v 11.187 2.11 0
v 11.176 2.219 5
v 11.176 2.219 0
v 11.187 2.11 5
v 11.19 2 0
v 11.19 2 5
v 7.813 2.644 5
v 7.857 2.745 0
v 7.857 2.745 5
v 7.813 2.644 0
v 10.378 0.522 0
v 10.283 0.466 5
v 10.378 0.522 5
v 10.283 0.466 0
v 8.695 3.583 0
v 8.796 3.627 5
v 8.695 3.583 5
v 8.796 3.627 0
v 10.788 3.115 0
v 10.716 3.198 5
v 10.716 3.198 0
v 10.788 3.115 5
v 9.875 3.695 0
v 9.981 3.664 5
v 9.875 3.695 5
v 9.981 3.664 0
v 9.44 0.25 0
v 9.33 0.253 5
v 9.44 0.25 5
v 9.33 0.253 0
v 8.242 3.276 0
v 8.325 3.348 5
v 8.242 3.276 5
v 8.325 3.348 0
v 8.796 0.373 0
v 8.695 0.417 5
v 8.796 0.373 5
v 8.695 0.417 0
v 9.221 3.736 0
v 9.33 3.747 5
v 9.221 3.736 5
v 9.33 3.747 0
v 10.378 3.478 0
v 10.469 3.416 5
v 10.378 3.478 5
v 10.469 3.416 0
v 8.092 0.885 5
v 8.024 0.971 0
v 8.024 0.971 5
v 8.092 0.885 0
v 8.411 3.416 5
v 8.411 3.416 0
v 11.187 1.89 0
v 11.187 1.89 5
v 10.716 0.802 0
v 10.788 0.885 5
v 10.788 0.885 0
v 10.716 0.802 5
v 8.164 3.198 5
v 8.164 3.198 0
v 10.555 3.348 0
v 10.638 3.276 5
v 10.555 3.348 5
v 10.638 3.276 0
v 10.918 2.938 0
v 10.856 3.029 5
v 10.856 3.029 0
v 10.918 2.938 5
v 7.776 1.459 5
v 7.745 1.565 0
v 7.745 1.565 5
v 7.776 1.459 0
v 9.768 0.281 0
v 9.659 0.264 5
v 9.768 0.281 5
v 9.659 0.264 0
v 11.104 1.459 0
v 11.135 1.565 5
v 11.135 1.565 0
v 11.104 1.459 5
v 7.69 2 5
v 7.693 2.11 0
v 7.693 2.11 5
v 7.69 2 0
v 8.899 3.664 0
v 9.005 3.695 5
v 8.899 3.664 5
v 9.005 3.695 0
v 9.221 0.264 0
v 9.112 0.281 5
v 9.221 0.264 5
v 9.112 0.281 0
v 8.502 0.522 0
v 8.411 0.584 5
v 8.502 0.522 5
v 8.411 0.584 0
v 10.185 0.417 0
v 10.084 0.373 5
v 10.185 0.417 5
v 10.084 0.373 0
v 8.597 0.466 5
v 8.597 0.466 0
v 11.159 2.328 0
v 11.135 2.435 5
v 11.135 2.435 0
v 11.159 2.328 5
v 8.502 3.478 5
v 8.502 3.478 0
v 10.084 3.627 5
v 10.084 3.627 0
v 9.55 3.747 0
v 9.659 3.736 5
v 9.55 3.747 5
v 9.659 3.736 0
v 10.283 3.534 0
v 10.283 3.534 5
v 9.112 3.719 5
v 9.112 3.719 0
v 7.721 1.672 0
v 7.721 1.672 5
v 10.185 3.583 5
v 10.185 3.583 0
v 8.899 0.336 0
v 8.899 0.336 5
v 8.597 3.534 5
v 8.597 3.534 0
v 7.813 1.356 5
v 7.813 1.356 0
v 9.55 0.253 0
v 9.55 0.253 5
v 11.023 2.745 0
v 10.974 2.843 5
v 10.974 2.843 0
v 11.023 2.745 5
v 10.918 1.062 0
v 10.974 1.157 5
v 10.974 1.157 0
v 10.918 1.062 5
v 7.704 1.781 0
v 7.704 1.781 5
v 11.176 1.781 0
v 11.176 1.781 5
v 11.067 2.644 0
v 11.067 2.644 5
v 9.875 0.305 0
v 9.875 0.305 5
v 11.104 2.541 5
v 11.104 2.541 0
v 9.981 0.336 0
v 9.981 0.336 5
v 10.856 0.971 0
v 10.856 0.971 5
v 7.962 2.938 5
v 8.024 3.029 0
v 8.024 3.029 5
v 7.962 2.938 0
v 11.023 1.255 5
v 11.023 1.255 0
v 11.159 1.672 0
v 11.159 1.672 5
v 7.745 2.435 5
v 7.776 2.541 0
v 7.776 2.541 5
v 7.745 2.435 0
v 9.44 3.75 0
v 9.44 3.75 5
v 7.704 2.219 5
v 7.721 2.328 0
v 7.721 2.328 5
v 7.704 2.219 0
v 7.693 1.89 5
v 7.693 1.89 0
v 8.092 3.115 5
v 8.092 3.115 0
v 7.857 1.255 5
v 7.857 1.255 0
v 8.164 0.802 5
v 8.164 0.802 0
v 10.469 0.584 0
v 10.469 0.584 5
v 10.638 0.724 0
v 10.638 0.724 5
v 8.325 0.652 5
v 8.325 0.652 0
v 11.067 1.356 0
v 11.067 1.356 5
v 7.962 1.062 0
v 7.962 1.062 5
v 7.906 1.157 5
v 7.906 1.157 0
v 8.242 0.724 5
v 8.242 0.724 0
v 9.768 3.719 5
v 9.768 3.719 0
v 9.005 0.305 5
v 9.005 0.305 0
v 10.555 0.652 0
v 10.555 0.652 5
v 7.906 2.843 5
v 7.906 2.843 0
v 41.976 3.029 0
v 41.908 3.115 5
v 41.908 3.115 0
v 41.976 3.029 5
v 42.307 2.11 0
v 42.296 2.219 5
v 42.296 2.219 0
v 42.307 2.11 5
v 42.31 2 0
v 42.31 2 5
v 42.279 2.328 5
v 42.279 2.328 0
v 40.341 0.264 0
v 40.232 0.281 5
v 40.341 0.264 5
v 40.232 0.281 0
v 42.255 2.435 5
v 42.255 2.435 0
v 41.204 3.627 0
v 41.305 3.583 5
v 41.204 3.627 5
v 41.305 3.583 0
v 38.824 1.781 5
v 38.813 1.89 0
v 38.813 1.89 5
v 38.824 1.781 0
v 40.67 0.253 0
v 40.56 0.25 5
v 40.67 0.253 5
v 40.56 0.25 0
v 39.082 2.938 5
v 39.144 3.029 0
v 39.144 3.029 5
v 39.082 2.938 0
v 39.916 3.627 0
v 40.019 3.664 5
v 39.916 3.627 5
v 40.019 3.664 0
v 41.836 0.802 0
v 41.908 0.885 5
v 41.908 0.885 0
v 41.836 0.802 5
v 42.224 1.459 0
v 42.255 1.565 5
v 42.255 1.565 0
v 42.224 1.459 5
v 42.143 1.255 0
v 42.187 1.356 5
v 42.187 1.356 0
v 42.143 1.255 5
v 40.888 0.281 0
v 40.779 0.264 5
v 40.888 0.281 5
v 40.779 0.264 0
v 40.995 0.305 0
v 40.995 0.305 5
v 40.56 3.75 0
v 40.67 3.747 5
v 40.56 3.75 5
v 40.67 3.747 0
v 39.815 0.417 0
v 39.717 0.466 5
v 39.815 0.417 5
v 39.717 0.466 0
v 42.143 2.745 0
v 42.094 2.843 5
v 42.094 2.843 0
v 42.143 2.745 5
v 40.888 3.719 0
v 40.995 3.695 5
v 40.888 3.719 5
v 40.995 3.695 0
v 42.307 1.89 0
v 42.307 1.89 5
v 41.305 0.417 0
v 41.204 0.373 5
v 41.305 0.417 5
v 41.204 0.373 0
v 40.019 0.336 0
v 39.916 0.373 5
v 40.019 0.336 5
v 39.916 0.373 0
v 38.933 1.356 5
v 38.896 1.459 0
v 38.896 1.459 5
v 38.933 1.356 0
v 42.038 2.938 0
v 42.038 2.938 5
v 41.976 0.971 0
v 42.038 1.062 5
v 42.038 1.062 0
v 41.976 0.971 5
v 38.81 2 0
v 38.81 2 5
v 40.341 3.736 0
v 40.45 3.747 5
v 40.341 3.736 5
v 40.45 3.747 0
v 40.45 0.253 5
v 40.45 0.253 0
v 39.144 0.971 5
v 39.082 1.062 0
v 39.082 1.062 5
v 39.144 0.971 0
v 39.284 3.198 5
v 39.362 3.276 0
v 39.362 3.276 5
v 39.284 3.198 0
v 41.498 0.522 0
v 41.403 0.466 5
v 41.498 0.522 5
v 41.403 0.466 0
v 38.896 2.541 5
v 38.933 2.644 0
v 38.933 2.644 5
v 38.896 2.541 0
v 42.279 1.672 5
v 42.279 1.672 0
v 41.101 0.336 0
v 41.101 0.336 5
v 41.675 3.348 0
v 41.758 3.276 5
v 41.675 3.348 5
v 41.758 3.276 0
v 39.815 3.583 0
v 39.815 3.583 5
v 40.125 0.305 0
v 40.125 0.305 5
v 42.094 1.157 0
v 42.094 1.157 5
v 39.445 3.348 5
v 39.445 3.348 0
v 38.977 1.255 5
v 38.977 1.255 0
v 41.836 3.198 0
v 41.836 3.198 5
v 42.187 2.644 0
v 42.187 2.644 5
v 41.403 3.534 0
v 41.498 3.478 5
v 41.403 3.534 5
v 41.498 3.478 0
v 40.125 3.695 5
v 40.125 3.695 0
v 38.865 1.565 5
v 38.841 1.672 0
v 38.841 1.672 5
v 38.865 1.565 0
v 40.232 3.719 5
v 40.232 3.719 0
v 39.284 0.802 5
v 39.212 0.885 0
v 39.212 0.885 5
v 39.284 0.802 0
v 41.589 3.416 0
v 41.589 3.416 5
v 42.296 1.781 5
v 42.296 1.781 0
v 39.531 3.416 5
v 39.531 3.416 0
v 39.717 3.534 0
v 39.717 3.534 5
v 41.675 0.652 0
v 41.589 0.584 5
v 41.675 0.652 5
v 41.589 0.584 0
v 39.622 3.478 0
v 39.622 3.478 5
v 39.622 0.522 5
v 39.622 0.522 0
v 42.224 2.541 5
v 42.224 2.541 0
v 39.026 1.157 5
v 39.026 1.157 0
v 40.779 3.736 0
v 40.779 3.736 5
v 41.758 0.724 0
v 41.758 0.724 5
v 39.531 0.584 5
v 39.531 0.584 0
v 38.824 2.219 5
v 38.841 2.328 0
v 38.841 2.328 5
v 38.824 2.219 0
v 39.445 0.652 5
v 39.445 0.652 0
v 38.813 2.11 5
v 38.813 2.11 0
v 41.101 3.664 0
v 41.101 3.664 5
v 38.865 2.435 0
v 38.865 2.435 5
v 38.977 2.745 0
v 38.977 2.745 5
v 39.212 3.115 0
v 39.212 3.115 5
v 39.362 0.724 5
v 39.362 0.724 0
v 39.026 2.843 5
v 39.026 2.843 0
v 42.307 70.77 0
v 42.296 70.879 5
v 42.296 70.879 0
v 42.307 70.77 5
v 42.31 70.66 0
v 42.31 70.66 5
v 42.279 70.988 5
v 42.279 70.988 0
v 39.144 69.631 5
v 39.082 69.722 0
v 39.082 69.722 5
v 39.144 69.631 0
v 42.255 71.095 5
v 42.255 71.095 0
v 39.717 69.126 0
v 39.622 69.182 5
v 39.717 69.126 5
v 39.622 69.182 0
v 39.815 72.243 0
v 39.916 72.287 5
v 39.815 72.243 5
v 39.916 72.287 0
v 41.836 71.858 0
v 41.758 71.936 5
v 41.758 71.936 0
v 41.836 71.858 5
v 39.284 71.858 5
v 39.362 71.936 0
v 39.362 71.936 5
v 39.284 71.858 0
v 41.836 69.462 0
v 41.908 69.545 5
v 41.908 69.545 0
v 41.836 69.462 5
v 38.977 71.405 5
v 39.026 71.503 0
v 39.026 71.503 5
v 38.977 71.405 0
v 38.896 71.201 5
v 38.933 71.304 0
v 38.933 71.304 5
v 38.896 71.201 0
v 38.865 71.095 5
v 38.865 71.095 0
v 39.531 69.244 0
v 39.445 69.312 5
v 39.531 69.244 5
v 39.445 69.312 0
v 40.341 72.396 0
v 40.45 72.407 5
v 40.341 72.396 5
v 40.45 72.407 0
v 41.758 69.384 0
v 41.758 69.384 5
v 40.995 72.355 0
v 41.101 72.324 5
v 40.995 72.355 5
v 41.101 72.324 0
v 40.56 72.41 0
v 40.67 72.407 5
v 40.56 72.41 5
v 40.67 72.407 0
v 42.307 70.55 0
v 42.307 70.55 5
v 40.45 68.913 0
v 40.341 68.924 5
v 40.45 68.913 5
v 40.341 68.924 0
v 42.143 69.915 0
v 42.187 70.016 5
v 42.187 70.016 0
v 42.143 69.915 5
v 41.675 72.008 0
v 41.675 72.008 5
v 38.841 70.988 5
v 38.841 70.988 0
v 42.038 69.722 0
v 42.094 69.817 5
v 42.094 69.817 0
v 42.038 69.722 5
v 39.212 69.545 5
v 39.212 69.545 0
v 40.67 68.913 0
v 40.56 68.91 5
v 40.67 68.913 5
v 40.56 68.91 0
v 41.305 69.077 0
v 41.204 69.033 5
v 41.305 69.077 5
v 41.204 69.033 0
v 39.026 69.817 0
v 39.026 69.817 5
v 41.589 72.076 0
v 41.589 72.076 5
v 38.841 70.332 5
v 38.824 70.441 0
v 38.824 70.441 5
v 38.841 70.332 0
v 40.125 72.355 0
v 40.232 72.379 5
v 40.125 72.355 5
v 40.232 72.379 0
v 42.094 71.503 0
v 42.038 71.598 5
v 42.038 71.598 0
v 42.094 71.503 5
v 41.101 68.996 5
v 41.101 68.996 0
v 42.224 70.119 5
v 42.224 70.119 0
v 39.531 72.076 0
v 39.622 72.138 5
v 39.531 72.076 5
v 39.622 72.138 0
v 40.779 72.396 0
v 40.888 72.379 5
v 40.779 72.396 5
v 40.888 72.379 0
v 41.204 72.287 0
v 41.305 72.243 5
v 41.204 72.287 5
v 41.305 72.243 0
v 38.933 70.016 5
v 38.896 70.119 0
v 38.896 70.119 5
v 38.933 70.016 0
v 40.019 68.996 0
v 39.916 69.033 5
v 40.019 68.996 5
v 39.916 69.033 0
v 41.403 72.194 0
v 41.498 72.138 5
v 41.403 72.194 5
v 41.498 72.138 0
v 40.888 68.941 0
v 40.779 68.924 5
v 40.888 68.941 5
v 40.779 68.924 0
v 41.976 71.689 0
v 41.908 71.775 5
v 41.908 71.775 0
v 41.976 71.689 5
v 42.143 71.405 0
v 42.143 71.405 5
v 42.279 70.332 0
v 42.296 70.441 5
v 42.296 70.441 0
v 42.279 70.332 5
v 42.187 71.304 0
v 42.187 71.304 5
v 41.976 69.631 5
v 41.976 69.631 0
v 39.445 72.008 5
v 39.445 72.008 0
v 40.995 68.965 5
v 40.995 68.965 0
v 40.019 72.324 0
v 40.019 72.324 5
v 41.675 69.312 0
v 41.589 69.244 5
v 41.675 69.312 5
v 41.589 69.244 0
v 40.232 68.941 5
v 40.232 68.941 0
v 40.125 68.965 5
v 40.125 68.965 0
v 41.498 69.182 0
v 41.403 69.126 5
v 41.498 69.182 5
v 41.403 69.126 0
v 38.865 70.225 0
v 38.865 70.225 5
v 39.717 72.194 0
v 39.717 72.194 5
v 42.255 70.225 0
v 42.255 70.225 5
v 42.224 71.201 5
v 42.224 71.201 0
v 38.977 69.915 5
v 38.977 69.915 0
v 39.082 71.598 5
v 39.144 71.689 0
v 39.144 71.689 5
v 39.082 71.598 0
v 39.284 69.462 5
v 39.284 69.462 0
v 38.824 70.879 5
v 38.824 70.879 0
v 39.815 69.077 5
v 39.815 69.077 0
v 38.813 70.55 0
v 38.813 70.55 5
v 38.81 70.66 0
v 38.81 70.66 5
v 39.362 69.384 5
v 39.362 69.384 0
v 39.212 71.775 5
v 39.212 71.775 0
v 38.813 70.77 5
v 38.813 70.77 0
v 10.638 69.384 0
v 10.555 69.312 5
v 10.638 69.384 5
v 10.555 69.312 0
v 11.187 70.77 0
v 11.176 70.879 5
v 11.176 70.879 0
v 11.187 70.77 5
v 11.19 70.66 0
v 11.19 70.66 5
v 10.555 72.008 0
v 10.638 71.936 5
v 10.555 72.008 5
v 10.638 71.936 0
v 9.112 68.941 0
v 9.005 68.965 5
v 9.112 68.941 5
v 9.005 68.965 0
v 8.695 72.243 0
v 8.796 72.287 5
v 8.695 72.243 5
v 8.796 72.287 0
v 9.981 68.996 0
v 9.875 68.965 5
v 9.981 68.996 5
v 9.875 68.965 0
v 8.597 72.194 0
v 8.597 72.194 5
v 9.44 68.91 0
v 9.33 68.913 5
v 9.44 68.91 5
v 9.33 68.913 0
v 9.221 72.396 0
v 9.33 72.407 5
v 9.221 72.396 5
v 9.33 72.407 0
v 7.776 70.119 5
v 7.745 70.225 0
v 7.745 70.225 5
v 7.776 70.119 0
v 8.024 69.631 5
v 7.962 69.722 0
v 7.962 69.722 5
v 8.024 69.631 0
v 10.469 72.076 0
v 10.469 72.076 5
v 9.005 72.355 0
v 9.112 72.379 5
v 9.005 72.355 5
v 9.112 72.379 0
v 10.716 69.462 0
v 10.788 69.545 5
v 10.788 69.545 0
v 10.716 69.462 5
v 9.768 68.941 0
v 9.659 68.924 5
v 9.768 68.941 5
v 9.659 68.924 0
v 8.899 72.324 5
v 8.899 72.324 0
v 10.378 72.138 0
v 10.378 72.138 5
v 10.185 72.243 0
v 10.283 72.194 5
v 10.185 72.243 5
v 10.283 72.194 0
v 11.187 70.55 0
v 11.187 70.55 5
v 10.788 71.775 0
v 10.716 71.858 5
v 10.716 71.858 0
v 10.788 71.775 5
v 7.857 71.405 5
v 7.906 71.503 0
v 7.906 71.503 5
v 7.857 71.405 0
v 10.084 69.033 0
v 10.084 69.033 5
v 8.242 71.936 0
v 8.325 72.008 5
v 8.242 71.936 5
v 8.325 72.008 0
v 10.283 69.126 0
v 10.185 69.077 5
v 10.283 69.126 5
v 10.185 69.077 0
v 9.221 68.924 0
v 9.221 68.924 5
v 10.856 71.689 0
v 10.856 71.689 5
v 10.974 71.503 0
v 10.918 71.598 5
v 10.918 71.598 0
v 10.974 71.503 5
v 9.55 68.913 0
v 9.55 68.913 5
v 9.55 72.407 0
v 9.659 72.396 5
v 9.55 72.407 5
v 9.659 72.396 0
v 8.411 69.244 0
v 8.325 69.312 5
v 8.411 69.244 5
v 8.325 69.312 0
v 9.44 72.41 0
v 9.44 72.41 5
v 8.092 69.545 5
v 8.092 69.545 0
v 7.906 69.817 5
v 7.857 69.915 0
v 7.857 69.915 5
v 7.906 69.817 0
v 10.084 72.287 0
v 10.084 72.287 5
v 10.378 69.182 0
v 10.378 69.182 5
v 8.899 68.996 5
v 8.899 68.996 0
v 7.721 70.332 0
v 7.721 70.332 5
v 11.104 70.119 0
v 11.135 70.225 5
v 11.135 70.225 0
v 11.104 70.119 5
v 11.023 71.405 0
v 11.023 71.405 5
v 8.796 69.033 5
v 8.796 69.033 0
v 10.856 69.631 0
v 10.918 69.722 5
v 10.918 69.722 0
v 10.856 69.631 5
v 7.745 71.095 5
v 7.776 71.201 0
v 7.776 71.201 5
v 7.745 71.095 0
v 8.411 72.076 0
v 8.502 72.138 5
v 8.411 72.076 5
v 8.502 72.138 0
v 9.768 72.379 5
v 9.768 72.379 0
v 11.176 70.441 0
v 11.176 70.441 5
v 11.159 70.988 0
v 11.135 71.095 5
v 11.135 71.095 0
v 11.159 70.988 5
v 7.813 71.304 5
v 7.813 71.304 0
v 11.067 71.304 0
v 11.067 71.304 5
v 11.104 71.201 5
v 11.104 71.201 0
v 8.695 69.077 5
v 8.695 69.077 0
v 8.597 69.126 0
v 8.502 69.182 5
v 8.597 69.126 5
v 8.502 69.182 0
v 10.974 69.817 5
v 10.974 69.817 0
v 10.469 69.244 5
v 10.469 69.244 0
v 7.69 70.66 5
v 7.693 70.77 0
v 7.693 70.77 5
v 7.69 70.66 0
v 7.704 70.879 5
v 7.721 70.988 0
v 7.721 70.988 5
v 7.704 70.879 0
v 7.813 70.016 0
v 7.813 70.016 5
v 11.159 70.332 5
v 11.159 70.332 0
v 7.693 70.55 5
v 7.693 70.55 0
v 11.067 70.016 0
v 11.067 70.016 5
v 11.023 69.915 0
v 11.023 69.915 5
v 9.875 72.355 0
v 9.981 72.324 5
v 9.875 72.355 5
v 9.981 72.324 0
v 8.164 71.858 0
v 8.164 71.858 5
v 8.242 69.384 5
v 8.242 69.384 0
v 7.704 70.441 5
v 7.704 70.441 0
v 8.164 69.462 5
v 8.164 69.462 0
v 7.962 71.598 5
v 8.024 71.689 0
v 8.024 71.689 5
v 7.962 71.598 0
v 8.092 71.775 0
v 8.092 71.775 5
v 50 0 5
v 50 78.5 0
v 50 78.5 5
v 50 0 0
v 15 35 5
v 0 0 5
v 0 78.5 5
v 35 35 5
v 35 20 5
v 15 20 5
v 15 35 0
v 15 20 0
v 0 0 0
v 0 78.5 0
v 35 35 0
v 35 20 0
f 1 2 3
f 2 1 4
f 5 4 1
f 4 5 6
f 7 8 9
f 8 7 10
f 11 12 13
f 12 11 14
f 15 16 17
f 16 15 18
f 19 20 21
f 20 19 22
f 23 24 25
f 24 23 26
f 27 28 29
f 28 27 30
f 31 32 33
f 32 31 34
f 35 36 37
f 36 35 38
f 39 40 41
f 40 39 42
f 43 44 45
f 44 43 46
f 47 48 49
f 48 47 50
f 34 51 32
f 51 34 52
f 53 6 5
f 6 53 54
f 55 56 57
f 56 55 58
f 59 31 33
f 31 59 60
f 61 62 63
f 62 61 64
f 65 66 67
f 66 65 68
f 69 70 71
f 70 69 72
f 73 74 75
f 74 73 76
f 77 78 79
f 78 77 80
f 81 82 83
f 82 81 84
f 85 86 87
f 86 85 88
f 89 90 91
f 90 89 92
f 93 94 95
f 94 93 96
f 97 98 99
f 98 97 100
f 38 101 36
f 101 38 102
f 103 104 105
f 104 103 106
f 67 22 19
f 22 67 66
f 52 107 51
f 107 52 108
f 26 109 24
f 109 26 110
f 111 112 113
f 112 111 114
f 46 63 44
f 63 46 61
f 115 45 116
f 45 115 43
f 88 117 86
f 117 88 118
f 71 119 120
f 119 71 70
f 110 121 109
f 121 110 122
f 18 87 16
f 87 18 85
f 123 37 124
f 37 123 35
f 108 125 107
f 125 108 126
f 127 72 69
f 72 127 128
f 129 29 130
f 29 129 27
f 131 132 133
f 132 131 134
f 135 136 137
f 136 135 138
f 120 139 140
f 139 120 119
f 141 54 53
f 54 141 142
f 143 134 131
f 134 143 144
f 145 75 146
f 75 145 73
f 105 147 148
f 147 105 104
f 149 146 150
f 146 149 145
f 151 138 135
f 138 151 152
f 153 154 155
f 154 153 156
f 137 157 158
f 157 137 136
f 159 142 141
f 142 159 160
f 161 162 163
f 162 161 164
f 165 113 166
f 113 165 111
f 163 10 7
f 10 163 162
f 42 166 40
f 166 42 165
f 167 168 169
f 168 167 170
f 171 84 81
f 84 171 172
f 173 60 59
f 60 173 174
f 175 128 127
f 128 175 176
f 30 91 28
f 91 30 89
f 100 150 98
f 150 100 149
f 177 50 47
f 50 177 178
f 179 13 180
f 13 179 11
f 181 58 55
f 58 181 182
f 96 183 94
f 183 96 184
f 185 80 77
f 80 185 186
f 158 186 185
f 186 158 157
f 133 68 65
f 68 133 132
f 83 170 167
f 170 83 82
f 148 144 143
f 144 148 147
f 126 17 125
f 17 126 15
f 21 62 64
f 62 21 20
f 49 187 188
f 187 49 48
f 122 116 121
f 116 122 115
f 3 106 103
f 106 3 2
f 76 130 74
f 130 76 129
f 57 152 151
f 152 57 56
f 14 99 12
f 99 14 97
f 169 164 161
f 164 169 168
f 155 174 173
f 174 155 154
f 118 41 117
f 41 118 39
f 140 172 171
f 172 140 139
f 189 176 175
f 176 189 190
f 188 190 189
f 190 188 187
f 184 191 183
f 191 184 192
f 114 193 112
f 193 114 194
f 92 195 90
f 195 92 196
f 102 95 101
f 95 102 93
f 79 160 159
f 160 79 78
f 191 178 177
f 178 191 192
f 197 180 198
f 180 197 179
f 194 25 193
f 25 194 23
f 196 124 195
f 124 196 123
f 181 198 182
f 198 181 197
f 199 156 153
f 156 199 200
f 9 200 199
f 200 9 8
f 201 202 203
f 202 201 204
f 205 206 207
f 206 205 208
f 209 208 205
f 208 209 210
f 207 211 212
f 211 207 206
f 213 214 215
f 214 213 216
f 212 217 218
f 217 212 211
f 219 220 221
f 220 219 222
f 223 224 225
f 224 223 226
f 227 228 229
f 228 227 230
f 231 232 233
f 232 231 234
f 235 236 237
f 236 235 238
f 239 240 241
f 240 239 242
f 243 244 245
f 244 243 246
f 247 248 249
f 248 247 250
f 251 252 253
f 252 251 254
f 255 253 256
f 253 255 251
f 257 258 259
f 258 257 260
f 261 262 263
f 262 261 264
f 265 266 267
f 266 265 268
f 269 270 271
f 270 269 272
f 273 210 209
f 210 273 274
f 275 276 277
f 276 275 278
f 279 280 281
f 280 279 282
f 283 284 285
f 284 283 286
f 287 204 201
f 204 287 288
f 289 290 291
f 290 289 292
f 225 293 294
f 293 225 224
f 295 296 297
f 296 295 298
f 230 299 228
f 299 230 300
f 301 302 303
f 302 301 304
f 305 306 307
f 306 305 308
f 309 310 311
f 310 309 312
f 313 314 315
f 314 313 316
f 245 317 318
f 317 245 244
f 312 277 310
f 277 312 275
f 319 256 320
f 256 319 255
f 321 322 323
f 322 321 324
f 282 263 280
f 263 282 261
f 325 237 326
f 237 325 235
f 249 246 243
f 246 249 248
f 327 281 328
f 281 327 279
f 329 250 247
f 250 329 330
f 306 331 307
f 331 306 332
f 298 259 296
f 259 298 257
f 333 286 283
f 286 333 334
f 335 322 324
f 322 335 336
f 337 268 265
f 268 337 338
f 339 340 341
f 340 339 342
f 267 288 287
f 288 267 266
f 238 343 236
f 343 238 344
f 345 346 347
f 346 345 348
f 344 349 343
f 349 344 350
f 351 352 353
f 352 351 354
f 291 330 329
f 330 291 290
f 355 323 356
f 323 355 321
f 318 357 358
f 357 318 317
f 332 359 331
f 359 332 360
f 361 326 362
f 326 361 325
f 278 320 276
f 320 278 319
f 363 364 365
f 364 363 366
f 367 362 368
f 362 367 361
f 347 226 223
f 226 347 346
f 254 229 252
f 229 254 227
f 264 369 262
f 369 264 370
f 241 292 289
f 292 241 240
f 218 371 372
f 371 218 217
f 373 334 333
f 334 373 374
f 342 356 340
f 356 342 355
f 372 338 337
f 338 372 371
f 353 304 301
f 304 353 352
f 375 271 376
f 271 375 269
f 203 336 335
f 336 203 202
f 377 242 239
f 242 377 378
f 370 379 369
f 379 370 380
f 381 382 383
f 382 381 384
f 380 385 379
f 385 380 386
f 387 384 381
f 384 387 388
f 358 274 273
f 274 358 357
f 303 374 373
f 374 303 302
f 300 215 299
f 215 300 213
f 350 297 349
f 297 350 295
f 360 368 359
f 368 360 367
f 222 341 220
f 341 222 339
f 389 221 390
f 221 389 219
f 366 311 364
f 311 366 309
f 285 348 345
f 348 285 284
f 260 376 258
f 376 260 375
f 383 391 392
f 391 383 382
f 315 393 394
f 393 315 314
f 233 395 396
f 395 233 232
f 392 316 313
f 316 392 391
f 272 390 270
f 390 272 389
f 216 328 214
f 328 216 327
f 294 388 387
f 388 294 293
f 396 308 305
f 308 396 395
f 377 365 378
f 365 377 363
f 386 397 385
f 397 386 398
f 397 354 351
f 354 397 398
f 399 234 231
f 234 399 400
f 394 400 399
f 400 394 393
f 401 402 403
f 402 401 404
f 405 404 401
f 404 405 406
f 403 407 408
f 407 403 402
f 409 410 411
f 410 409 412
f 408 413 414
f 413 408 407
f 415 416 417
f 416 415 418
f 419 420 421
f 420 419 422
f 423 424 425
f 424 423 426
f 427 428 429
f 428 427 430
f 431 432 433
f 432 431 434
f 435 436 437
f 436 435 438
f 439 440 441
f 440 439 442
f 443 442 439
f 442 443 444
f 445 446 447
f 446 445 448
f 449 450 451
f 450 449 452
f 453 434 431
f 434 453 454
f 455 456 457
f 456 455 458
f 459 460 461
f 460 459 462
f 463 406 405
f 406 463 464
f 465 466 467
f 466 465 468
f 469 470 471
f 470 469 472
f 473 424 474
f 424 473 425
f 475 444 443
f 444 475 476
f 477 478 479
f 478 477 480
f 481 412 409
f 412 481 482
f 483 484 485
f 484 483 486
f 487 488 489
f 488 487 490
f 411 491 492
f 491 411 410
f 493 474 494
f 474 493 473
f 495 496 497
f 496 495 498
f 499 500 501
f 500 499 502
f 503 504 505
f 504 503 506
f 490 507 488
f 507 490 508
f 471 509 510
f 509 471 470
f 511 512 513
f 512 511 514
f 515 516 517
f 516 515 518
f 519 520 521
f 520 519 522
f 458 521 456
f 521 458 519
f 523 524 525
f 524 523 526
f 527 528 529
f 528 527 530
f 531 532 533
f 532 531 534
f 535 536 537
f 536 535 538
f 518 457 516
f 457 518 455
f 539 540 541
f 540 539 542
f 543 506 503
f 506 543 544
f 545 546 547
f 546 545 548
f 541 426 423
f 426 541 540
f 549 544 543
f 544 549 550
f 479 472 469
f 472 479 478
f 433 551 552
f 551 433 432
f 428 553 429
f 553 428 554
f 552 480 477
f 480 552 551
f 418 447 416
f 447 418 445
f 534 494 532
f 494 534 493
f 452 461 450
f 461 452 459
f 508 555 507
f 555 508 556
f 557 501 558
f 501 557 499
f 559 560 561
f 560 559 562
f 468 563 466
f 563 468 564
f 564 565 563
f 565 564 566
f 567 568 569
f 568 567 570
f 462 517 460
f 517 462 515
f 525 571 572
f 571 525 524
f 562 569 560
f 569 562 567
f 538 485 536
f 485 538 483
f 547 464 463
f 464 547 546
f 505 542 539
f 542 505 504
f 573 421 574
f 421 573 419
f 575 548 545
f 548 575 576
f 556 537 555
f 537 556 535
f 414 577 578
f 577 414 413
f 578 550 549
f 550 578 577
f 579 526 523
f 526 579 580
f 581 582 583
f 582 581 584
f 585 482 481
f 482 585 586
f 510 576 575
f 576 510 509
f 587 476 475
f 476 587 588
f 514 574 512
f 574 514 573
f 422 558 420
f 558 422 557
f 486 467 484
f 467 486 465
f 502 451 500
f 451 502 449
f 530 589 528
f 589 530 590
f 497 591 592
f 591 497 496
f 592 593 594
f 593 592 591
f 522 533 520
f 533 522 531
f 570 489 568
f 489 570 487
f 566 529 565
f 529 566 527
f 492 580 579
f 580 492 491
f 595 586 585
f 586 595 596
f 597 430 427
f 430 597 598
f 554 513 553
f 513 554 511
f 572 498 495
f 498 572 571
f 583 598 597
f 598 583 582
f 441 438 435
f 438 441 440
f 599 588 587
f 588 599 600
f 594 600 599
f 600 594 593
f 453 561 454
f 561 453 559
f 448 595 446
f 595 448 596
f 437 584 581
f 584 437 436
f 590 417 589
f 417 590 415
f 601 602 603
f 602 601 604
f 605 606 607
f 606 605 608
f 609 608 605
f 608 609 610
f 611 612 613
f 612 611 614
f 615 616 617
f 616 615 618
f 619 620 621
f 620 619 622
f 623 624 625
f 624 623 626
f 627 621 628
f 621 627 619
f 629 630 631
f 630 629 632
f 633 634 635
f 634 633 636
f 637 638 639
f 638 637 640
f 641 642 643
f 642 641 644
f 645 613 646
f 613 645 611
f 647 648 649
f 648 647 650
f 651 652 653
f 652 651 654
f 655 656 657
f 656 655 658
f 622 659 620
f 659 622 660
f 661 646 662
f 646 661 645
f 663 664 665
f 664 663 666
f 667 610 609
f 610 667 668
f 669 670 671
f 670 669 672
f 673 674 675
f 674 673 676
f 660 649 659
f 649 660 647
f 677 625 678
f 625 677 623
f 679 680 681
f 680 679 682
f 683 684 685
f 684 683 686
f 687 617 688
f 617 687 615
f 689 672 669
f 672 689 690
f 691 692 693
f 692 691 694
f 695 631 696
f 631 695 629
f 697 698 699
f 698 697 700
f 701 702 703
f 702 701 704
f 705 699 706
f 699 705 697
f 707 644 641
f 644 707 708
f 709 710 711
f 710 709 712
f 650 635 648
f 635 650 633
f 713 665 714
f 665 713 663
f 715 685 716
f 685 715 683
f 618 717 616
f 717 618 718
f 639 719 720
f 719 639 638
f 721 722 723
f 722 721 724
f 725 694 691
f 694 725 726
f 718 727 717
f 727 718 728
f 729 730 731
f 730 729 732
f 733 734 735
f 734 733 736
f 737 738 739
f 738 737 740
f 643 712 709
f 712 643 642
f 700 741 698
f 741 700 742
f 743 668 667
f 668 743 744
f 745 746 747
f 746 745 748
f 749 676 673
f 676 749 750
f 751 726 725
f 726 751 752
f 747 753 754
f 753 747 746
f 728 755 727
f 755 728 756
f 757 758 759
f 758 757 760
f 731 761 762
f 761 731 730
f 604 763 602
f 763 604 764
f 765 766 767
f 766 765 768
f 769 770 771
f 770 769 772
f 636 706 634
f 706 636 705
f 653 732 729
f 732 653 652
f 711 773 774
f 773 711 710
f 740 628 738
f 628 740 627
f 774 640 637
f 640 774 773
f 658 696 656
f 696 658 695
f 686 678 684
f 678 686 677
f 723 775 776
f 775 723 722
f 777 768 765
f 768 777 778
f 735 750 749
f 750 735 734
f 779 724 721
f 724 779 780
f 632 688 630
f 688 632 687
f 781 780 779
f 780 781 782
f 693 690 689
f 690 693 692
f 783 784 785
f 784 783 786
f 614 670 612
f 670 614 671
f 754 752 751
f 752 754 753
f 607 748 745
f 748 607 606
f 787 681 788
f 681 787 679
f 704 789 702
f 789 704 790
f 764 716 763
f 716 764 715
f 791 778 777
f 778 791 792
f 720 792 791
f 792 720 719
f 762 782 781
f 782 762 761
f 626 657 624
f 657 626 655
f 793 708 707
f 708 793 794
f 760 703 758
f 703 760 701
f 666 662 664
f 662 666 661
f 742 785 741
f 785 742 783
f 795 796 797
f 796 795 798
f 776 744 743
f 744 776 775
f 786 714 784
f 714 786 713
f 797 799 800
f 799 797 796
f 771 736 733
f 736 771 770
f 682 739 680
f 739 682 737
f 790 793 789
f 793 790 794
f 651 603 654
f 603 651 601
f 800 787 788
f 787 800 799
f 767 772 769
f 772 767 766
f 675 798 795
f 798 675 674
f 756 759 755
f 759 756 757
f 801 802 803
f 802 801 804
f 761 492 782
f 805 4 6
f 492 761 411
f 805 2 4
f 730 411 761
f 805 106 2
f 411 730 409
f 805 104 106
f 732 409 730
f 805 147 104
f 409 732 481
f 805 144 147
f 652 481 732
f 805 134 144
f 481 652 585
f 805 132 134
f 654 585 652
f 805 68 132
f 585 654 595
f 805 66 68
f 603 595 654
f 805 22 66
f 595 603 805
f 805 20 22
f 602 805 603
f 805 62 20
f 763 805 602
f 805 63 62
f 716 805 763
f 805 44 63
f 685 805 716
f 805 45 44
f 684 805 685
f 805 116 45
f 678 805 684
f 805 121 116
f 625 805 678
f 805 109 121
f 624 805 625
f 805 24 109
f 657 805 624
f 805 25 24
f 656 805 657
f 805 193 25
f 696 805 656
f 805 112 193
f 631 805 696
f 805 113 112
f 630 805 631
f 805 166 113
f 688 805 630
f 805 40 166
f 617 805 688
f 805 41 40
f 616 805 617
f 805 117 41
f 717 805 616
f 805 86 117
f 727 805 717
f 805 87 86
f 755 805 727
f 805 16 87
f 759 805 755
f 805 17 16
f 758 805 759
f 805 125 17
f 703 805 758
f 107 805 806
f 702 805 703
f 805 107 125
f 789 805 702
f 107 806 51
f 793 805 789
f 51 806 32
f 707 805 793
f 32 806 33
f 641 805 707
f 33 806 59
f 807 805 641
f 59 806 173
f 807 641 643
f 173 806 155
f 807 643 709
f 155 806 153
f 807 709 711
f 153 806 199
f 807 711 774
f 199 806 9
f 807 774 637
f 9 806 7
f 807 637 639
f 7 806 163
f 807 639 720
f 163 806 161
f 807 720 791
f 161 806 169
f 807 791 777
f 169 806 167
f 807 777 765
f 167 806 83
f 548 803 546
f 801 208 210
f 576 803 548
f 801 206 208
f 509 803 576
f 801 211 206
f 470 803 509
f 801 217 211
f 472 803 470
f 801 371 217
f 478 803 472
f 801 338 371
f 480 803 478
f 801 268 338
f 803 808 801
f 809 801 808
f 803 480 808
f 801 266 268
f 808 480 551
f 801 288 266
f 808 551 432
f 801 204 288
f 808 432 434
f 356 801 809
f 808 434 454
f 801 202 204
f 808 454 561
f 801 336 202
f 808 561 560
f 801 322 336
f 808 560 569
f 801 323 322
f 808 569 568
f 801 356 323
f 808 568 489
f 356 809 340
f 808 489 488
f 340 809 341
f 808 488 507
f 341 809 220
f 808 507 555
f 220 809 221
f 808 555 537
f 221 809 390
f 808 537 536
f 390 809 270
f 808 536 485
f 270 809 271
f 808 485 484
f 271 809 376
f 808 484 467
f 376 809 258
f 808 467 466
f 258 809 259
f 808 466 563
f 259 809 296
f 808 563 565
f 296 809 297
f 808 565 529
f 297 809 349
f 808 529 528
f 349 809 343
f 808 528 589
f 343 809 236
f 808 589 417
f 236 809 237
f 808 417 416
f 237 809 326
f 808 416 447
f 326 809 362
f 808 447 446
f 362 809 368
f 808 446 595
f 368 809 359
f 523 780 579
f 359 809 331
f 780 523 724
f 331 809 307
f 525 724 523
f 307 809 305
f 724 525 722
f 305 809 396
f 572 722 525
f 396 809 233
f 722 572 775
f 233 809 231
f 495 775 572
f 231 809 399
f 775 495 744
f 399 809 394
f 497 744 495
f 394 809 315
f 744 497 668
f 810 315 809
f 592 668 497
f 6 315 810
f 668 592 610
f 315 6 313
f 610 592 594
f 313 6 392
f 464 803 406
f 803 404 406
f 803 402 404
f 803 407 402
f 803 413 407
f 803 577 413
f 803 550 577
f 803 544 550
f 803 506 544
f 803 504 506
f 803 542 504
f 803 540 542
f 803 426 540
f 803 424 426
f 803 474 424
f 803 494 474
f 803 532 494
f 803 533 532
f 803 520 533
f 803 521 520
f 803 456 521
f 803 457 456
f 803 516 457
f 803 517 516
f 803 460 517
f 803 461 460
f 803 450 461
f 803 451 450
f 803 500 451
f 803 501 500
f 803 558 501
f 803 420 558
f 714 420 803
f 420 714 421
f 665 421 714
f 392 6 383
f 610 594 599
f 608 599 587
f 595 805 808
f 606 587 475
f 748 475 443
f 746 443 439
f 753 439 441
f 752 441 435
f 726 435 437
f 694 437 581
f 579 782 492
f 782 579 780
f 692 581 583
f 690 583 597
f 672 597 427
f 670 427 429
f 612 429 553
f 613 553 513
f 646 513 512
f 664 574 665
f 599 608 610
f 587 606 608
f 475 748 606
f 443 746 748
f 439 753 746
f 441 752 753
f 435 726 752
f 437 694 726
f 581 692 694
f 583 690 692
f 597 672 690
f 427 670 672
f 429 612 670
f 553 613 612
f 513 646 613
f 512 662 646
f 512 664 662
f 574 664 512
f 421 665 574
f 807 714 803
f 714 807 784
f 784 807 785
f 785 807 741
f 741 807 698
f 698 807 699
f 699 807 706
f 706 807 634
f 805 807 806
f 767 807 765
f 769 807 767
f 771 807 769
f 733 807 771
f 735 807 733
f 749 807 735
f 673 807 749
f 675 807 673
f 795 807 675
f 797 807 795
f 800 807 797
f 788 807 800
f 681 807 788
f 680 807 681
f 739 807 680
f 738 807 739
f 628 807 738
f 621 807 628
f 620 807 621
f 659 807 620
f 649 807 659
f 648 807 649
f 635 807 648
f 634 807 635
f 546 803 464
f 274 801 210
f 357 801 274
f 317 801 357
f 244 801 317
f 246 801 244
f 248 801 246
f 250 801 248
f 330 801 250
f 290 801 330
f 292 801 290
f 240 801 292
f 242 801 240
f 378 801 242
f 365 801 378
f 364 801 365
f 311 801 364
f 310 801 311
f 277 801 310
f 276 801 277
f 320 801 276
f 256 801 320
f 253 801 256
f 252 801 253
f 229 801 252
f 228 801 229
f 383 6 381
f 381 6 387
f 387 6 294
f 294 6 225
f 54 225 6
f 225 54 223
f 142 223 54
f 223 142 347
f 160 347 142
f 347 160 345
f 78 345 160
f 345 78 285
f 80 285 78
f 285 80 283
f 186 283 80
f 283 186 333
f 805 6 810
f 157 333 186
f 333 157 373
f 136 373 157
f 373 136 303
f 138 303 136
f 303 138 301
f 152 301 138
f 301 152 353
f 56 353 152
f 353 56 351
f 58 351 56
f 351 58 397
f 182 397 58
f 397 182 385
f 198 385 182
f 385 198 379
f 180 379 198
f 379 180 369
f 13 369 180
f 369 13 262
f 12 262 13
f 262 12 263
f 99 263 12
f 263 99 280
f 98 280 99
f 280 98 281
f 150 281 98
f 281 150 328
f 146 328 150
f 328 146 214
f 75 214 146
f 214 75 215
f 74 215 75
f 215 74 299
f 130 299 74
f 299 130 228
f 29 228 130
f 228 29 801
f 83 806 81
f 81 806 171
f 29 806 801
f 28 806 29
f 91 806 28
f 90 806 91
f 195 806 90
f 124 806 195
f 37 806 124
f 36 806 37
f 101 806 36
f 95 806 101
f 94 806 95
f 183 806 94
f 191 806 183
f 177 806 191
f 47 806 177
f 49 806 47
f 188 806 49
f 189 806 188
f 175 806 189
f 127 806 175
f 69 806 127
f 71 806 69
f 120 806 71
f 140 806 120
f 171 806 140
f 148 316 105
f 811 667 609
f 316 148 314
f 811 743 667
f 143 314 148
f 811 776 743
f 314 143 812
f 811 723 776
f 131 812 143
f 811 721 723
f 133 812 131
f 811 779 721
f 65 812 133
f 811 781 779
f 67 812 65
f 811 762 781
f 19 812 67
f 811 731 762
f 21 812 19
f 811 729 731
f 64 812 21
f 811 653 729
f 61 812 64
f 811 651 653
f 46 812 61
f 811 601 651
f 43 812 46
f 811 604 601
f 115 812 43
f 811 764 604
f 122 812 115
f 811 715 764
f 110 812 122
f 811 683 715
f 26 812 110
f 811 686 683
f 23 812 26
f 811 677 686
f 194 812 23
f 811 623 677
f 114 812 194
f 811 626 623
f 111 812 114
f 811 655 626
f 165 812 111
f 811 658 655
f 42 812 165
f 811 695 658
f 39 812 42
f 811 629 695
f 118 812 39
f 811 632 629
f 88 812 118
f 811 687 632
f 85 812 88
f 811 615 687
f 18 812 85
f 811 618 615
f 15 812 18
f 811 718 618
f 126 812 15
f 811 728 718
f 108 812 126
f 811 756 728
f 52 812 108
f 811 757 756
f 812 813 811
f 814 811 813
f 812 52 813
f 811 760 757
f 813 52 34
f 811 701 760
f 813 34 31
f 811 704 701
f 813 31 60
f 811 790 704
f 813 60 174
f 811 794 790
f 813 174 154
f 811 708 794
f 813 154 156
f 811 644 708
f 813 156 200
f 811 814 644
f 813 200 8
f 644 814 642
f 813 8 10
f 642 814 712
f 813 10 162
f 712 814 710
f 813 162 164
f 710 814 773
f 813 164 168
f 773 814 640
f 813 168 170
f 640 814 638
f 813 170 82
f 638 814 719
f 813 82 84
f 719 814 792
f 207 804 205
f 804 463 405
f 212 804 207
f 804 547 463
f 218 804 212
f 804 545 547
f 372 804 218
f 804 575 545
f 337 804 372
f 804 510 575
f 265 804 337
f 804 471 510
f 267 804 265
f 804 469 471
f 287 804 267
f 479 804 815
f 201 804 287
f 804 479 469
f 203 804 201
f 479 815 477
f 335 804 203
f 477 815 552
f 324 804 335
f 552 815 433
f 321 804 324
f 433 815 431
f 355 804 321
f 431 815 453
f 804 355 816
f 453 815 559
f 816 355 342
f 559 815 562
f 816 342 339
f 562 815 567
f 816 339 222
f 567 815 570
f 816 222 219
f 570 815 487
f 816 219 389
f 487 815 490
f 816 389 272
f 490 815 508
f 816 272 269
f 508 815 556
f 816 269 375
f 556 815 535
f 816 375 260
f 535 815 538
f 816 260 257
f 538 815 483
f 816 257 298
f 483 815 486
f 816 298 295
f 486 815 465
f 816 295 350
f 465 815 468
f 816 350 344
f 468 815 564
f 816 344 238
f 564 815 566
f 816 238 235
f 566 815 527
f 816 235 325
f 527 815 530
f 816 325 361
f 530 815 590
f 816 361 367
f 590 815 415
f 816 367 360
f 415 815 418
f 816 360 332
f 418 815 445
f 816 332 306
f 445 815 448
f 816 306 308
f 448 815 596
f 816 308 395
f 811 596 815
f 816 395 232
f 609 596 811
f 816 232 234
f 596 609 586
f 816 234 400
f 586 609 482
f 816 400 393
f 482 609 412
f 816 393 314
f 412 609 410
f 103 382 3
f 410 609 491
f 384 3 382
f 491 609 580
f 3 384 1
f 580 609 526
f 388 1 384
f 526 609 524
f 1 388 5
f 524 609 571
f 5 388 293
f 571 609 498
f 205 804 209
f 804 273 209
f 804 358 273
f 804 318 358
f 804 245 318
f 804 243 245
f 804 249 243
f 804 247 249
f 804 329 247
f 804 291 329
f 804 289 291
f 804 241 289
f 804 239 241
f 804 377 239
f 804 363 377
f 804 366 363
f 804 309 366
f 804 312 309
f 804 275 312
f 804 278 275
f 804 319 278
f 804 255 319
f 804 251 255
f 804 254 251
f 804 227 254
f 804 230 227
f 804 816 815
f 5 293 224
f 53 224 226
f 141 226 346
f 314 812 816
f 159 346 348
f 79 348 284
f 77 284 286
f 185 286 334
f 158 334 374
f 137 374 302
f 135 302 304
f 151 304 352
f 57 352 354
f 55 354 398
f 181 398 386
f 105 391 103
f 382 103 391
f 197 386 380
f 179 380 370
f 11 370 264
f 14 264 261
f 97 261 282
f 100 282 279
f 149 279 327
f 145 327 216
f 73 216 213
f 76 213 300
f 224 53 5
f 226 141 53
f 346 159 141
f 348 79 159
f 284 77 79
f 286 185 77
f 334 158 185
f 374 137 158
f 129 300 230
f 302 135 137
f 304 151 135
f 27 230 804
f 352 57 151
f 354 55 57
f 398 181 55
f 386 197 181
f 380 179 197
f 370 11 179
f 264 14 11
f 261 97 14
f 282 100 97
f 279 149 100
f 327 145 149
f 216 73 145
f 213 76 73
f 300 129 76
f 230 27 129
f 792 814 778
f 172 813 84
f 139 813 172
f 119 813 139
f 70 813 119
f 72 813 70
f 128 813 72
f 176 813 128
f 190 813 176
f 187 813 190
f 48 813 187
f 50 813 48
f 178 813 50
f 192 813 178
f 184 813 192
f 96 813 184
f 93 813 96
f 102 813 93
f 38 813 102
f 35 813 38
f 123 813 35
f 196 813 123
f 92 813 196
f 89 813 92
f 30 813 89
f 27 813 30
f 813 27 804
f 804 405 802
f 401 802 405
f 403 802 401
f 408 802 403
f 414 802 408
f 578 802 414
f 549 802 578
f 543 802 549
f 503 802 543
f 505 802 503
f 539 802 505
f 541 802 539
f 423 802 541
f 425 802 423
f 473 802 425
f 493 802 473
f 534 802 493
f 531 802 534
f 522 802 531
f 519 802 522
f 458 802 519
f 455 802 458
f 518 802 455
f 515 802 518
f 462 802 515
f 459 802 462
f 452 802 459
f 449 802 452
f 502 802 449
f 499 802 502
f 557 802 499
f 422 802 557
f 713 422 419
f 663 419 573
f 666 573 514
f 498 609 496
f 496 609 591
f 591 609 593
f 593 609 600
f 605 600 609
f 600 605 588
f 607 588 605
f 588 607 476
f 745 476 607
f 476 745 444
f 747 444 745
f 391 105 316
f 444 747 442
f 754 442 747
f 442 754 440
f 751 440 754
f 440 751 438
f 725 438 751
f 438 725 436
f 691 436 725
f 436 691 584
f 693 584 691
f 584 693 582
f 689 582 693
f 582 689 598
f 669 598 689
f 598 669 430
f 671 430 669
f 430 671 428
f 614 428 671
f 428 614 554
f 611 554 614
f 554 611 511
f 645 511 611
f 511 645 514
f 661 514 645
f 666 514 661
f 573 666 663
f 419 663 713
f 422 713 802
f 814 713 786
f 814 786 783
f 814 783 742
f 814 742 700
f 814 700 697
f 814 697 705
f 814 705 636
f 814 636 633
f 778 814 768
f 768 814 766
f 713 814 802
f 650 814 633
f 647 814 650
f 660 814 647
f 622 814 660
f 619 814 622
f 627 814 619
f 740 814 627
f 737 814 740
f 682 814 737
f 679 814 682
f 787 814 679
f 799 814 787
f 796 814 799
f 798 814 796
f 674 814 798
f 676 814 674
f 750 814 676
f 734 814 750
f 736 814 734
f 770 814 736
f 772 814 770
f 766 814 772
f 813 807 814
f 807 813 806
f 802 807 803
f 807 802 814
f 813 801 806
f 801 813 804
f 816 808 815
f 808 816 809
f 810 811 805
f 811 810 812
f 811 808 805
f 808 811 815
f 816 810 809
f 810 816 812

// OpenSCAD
// Sumobot - Top Mount
// ~54 -> 50
// ~86.7 -> 85 -(13/2) = 
// 68.66 -> 68.66
// `1.75 + 0.2 -> 2.05
// offset = radius + tolerance 
// offset = 1.75 + 0.25 = 2.00

// TODO: embedded axle

$fn=100;

width = 5;
hole = 100;

difference() {
    cube([50, 78.5, width]);
    
    // Mounting Holes
    translate([9.44, 2.00, 0]) {
        union() {
            cylinder(h=hole, d=3.5, center=true);
            
            translate([31.12 , 0, 0]) {
                cylinder(h=hole, d=3.5, center=true);
            }
            
            translate([31.12, +68.66, 0]) {
                cylinder(h=hole, d=3.5, center=true);
            }
            
            translate([0, +68.66, 0]) {
                cylinder(h=hole, d=3.5, center=true);
            }
        }
    }
    
    // Wiring gap : 20 * 15, offset = 20
    translate([15, 20 , 0]) {
        cube([20, 15, hole]);
    }
}
